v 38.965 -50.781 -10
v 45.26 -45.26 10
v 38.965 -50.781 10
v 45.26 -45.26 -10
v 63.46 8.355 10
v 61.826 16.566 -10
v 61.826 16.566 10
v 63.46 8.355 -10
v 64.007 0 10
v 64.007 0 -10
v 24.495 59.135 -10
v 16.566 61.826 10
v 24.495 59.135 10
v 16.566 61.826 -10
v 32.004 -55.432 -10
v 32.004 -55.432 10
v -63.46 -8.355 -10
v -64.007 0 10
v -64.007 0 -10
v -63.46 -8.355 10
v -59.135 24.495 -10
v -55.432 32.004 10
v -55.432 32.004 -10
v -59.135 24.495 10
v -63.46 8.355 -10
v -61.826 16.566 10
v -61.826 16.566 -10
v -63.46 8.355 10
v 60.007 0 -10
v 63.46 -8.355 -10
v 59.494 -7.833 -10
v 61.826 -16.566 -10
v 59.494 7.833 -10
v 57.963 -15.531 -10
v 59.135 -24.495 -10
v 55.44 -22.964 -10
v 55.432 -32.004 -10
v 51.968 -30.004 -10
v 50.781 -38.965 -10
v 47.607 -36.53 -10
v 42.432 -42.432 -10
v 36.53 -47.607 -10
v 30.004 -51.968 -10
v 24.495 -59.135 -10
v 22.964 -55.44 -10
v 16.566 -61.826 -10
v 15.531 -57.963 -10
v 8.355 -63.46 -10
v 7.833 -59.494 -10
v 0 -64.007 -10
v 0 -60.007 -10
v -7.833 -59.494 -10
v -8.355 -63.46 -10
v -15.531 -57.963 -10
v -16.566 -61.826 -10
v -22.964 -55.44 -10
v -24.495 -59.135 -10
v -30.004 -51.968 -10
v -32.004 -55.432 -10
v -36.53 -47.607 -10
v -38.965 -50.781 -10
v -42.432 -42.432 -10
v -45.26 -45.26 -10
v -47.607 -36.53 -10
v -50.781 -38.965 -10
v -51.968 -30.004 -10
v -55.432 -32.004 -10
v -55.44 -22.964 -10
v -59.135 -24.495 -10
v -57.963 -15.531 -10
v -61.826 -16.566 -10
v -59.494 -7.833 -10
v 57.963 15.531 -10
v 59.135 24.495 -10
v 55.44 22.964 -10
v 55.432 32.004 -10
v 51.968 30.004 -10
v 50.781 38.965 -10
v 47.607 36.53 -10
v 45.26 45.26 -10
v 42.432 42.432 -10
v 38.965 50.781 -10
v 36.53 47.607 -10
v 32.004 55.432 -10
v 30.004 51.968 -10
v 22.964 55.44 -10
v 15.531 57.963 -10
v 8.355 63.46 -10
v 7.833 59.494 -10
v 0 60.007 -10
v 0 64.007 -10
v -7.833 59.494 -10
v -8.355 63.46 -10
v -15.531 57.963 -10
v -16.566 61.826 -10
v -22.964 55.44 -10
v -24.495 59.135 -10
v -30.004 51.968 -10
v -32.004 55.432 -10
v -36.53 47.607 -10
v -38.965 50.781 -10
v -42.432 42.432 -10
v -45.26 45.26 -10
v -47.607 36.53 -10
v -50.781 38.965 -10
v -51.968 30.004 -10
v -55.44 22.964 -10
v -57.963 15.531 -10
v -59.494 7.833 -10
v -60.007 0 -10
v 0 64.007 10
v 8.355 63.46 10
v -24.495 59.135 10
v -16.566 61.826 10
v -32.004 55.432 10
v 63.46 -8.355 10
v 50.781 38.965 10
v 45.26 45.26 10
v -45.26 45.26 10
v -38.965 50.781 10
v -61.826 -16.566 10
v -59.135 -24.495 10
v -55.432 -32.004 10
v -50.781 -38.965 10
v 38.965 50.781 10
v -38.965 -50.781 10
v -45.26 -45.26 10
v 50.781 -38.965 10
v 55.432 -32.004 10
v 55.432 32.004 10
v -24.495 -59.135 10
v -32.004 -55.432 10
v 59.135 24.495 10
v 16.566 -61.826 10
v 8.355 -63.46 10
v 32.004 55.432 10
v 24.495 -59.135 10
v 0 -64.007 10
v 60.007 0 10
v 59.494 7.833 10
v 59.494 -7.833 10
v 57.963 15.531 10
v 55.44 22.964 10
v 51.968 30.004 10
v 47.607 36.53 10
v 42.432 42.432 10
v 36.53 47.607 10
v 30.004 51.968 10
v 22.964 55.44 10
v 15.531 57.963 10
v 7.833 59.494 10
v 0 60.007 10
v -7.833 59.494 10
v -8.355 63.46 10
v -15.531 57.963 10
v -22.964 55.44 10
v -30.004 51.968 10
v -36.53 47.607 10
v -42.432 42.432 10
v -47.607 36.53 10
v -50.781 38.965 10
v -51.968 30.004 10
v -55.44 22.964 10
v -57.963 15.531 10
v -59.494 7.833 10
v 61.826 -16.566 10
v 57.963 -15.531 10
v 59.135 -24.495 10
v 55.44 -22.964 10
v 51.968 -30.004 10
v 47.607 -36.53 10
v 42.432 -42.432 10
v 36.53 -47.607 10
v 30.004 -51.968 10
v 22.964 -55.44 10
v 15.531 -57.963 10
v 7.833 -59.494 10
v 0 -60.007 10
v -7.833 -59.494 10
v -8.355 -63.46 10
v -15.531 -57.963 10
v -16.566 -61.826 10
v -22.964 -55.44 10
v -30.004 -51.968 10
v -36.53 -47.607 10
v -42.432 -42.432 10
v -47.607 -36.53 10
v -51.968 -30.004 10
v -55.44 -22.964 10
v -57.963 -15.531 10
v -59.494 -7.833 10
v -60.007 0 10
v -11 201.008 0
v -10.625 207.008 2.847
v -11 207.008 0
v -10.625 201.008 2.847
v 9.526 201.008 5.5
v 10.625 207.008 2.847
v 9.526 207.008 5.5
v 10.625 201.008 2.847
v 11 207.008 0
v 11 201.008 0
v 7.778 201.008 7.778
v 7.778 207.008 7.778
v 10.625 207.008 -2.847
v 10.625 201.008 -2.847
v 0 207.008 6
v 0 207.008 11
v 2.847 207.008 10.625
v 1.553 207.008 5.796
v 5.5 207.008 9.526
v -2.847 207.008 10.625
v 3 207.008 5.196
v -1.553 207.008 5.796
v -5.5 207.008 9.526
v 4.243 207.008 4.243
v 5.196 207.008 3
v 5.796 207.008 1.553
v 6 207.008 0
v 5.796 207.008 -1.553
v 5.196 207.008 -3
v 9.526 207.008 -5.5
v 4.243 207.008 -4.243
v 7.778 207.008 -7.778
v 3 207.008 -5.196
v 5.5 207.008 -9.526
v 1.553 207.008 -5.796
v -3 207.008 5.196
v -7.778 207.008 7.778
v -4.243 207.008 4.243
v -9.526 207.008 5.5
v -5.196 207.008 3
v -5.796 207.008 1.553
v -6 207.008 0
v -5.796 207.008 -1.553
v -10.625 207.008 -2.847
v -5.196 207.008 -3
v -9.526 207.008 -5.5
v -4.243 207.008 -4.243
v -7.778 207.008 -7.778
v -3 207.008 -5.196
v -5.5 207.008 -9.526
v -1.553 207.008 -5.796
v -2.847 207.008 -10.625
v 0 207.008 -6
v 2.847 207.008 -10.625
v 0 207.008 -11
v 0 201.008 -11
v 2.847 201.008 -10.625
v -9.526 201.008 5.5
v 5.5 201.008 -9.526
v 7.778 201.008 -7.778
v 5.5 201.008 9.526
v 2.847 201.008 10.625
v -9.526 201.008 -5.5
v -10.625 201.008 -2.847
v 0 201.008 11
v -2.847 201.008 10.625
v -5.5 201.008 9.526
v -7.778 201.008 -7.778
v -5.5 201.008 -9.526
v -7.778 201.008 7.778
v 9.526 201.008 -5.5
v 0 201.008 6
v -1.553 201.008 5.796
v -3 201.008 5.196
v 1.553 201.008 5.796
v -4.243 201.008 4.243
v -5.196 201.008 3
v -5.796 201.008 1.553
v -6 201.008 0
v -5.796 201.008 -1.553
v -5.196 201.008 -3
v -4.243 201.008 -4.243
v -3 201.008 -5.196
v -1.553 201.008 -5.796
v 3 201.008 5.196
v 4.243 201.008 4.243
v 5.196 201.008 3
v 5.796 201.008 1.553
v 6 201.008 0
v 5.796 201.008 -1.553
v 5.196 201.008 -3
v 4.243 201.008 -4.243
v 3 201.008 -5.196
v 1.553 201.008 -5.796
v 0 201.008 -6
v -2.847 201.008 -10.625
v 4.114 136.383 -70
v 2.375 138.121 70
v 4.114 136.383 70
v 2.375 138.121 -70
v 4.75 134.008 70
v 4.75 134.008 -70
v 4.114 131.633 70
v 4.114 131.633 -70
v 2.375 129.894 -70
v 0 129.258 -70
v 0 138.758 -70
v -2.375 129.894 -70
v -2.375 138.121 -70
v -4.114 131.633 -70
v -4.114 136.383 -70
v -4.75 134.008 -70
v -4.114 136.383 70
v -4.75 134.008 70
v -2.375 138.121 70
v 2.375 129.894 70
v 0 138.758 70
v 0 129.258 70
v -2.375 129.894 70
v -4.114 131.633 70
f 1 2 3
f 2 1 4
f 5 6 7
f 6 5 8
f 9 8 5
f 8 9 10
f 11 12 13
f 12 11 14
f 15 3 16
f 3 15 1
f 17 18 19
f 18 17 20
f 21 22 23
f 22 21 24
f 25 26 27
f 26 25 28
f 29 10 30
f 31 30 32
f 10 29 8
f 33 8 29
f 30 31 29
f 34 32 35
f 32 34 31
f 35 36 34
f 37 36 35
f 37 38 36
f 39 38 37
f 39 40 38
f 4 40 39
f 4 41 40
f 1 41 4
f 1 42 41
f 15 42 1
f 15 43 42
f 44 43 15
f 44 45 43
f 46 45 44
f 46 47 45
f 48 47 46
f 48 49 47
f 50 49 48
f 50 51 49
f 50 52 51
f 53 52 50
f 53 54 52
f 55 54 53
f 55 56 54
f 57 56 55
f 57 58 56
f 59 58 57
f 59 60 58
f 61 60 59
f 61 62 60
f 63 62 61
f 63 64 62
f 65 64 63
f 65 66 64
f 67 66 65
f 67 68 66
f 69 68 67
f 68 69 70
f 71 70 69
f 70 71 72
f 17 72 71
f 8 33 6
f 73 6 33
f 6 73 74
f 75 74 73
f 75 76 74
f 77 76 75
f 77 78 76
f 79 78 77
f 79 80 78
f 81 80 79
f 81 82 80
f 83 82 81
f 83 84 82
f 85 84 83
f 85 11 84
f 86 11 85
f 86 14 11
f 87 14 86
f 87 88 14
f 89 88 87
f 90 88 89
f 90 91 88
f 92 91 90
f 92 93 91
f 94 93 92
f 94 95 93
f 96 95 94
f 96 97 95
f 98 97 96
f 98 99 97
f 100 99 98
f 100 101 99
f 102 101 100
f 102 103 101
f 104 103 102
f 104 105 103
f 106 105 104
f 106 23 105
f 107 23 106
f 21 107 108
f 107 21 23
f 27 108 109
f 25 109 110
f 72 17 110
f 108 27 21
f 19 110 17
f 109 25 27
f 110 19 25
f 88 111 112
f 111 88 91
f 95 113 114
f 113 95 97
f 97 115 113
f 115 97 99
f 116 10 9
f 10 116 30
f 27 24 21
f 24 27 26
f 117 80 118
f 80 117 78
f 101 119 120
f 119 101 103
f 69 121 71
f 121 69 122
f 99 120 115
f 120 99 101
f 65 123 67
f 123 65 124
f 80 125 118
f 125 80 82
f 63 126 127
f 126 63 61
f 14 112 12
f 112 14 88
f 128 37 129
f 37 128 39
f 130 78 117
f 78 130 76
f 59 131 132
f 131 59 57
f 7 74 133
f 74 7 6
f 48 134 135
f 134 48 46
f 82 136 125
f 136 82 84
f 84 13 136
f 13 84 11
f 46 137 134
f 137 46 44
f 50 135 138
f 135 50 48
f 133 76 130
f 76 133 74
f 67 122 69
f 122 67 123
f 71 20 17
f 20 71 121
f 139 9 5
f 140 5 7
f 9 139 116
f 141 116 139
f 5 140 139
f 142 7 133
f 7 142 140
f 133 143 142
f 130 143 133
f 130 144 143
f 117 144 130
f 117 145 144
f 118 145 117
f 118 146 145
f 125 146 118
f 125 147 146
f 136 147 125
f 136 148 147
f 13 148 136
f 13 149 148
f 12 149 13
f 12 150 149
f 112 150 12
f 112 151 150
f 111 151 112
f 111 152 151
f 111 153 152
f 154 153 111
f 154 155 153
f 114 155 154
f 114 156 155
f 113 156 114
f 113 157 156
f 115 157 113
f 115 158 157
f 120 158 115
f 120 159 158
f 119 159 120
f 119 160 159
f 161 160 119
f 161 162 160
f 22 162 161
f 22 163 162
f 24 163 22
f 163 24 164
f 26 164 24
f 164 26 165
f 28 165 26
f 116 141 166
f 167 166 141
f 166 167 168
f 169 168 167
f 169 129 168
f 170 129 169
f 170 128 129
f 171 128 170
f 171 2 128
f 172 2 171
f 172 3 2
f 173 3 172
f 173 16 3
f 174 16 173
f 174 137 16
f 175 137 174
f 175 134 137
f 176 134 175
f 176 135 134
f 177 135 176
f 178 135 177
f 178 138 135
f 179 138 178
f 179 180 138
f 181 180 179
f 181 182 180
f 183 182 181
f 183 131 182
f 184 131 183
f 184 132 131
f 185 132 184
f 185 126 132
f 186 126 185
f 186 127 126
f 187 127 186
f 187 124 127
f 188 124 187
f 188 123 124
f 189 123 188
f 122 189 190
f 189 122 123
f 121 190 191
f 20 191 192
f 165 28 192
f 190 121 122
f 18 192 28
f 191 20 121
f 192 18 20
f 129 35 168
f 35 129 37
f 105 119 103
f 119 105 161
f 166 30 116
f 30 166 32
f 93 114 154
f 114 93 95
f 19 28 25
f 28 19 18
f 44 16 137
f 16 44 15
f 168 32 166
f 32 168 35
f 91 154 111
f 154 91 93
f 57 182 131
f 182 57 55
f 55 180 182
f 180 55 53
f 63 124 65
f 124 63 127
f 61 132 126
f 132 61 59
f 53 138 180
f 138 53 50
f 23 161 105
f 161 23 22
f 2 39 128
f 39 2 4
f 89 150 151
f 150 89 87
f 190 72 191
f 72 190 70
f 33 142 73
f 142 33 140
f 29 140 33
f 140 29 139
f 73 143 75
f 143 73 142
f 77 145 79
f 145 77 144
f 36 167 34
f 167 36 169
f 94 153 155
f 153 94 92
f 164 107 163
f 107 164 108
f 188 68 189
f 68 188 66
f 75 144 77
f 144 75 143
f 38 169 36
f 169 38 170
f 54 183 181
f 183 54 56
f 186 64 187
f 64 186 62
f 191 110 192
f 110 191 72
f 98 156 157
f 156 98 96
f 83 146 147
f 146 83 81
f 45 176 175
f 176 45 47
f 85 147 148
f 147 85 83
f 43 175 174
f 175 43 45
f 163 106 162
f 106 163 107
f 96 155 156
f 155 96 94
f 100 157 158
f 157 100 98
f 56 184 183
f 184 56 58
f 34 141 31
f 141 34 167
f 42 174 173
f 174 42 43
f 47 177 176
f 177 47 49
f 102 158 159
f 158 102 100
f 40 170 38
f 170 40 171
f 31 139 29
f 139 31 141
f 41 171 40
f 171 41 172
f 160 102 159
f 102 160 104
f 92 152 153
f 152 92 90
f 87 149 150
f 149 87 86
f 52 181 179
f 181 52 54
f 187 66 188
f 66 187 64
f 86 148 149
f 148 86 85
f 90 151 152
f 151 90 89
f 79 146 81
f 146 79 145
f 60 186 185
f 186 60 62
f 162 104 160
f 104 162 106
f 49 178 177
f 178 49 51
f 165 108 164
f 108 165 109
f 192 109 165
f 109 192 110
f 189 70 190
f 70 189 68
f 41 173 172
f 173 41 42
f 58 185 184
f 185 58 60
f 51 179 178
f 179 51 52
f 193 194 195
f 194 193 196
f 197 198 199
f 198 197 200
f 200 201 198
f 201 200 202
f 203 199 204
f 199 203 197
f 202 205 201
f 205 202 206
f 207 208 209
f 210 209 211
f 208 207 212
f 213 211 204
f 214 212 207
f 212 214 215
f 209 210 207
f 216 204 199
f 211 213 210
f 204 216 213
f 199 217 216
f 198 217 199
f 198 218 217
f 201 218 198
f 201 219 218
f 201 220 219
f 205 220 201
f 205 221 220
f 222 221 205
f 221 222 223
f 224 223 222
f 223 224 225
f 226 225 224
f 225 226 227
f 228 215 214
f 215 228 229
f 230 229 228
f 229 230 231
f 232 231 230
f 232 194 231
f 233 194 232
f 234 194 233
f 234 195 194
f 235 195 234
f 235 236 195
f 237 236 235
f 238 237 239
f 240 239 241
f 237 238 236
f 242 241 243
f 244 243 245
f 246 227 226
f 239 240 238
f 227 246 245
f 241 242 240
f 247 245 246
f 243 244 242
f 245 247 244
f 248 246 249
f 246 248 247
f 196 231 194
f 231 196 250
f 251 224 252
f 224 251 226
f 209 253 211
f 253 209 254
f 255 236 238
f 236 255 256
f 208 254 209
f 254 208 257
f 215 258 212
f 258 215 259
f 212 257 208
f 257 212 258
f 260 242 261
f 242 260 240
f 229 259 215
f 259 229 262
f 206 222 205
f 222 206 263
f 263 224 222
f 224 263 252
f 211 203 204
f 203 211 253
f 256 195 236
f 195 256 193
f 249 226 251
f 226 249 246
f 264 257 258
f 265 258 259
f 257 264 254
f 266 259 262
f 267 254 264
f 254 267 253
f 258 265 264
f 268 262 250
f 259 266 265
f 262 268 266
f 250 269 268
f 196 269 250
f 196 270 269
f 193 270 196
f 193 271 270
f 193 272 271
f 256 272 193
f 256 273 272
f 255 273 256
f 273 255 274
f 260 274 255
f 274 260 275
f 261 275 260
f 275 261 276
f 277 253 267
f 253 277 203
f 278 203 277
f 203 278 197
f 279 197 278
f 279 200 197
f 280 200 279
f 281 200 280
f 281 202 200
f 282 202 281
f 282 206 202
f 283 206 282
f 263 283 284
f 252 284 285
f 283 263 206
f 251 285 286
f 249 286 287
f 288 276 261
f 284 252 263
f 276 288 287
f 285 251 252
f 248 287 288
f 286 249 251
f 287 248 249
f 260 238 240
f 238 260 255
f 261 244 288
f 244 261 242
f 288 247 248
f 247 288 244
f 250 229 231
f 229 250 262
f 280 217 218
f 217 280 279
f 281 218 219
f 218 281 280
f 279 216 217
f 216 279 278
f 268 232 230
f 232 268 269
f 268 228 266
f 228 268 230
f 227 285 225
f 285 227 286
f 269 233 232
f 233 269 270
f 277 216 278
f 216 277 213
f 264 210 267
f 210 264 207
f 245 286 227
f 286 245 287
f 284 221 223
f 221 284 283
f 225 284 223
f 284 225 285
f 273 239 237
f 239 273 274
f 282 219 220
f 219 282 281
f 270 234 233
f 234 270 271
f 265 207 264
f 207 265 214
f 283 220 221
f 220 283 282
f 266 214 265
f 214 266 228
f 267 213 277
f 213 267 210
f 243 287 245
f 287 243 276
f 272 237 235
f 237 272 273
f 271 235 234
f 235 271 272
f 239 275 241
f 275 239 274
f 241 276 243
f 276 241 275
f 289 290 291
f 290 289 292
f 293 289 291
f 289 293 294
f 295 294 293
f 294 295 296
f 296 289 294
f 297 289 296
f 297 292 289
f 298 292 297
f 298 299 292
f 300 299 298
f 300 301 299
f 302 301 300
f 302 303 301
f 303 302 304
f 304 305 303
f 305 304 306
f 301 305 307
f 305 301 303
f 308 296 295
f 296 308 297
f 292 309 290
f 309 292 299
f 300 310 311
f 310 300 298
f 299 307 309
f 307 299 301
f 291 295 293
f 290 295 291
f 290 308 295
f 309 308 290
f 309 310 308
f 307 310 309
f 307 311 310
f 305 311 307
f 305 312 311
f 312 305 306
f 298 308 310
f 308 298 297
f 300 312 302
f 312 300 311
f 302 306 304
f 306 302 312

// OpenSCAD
// Auto-generated by scripts/author_from_manifest.py (Phase D.3).
// Source: data/phase_d_manifest.json (sku_intent='tolco-fig82-riser-clamp-4in').
// Do not hand-edit — regenerate from the manifest.
//
// @part tolco_fig82_riser_clamp_4in
// @kind hanger
// @category hanger.riser.clamp
// @display-name "Tolco FIG 82 Riser Clamp 4\""
// @mfg nvent_tolco
// @mfg-pn FIG_82_4in
// @listing UL
// @price-usd 14.50
// @install-minutes 8
// @crew journeyman
// @param size_in number default=4 label="Size" unit="in"
// @port pipe position=[0,0,0] direction=[0,1,0] style=grooved size_in=4 role=run_a

size_in = 4.0;

function od_mm(nps) =
    nps ==   1  ? 33.4 :
    nps == 1.25 ? 42.2 :
    nps == 1.5  ? 48.3 :
    nps ==   2  ? 60.3 :
    nps == 2.5  ? 73.0 :
    nps ==   3  ? 88.9 :
    nps ==   4  ? 114.3 :
    nps ==   6  ? 168.3 :
    nps ==   8  ? 219.1 : 60.3;

od = od_mm(size_in);
ring_id = od * 1.05;
ring_od = ring_id + 8;
strap_w = 20;
rod_len = 140;

union() {
    // Ring
    difference() {
        cylinder(h = strap_w, d = ring_od, center = true, $fn = 48);
        cylinder(h = strap_w + 1, d = ring_id, center = true, $fn = 48);
    }
    // Rod up +Y
    translate([0, rod_len/2 + ring_od/2, 0])
        cylinder(h = rod_len, d = 9.5, center = true, $fn = 12);
    // Top swivel eye
    translate([0, rod_len + ring_od/2, 0])
        rotate([90, 0, 0])
        difference() {
            cylinder(h = 6, d = 22, center = true, $fn = 24);
            cylinder(h = 8, d = 12, center = true, $fn = 24);
        }
}
